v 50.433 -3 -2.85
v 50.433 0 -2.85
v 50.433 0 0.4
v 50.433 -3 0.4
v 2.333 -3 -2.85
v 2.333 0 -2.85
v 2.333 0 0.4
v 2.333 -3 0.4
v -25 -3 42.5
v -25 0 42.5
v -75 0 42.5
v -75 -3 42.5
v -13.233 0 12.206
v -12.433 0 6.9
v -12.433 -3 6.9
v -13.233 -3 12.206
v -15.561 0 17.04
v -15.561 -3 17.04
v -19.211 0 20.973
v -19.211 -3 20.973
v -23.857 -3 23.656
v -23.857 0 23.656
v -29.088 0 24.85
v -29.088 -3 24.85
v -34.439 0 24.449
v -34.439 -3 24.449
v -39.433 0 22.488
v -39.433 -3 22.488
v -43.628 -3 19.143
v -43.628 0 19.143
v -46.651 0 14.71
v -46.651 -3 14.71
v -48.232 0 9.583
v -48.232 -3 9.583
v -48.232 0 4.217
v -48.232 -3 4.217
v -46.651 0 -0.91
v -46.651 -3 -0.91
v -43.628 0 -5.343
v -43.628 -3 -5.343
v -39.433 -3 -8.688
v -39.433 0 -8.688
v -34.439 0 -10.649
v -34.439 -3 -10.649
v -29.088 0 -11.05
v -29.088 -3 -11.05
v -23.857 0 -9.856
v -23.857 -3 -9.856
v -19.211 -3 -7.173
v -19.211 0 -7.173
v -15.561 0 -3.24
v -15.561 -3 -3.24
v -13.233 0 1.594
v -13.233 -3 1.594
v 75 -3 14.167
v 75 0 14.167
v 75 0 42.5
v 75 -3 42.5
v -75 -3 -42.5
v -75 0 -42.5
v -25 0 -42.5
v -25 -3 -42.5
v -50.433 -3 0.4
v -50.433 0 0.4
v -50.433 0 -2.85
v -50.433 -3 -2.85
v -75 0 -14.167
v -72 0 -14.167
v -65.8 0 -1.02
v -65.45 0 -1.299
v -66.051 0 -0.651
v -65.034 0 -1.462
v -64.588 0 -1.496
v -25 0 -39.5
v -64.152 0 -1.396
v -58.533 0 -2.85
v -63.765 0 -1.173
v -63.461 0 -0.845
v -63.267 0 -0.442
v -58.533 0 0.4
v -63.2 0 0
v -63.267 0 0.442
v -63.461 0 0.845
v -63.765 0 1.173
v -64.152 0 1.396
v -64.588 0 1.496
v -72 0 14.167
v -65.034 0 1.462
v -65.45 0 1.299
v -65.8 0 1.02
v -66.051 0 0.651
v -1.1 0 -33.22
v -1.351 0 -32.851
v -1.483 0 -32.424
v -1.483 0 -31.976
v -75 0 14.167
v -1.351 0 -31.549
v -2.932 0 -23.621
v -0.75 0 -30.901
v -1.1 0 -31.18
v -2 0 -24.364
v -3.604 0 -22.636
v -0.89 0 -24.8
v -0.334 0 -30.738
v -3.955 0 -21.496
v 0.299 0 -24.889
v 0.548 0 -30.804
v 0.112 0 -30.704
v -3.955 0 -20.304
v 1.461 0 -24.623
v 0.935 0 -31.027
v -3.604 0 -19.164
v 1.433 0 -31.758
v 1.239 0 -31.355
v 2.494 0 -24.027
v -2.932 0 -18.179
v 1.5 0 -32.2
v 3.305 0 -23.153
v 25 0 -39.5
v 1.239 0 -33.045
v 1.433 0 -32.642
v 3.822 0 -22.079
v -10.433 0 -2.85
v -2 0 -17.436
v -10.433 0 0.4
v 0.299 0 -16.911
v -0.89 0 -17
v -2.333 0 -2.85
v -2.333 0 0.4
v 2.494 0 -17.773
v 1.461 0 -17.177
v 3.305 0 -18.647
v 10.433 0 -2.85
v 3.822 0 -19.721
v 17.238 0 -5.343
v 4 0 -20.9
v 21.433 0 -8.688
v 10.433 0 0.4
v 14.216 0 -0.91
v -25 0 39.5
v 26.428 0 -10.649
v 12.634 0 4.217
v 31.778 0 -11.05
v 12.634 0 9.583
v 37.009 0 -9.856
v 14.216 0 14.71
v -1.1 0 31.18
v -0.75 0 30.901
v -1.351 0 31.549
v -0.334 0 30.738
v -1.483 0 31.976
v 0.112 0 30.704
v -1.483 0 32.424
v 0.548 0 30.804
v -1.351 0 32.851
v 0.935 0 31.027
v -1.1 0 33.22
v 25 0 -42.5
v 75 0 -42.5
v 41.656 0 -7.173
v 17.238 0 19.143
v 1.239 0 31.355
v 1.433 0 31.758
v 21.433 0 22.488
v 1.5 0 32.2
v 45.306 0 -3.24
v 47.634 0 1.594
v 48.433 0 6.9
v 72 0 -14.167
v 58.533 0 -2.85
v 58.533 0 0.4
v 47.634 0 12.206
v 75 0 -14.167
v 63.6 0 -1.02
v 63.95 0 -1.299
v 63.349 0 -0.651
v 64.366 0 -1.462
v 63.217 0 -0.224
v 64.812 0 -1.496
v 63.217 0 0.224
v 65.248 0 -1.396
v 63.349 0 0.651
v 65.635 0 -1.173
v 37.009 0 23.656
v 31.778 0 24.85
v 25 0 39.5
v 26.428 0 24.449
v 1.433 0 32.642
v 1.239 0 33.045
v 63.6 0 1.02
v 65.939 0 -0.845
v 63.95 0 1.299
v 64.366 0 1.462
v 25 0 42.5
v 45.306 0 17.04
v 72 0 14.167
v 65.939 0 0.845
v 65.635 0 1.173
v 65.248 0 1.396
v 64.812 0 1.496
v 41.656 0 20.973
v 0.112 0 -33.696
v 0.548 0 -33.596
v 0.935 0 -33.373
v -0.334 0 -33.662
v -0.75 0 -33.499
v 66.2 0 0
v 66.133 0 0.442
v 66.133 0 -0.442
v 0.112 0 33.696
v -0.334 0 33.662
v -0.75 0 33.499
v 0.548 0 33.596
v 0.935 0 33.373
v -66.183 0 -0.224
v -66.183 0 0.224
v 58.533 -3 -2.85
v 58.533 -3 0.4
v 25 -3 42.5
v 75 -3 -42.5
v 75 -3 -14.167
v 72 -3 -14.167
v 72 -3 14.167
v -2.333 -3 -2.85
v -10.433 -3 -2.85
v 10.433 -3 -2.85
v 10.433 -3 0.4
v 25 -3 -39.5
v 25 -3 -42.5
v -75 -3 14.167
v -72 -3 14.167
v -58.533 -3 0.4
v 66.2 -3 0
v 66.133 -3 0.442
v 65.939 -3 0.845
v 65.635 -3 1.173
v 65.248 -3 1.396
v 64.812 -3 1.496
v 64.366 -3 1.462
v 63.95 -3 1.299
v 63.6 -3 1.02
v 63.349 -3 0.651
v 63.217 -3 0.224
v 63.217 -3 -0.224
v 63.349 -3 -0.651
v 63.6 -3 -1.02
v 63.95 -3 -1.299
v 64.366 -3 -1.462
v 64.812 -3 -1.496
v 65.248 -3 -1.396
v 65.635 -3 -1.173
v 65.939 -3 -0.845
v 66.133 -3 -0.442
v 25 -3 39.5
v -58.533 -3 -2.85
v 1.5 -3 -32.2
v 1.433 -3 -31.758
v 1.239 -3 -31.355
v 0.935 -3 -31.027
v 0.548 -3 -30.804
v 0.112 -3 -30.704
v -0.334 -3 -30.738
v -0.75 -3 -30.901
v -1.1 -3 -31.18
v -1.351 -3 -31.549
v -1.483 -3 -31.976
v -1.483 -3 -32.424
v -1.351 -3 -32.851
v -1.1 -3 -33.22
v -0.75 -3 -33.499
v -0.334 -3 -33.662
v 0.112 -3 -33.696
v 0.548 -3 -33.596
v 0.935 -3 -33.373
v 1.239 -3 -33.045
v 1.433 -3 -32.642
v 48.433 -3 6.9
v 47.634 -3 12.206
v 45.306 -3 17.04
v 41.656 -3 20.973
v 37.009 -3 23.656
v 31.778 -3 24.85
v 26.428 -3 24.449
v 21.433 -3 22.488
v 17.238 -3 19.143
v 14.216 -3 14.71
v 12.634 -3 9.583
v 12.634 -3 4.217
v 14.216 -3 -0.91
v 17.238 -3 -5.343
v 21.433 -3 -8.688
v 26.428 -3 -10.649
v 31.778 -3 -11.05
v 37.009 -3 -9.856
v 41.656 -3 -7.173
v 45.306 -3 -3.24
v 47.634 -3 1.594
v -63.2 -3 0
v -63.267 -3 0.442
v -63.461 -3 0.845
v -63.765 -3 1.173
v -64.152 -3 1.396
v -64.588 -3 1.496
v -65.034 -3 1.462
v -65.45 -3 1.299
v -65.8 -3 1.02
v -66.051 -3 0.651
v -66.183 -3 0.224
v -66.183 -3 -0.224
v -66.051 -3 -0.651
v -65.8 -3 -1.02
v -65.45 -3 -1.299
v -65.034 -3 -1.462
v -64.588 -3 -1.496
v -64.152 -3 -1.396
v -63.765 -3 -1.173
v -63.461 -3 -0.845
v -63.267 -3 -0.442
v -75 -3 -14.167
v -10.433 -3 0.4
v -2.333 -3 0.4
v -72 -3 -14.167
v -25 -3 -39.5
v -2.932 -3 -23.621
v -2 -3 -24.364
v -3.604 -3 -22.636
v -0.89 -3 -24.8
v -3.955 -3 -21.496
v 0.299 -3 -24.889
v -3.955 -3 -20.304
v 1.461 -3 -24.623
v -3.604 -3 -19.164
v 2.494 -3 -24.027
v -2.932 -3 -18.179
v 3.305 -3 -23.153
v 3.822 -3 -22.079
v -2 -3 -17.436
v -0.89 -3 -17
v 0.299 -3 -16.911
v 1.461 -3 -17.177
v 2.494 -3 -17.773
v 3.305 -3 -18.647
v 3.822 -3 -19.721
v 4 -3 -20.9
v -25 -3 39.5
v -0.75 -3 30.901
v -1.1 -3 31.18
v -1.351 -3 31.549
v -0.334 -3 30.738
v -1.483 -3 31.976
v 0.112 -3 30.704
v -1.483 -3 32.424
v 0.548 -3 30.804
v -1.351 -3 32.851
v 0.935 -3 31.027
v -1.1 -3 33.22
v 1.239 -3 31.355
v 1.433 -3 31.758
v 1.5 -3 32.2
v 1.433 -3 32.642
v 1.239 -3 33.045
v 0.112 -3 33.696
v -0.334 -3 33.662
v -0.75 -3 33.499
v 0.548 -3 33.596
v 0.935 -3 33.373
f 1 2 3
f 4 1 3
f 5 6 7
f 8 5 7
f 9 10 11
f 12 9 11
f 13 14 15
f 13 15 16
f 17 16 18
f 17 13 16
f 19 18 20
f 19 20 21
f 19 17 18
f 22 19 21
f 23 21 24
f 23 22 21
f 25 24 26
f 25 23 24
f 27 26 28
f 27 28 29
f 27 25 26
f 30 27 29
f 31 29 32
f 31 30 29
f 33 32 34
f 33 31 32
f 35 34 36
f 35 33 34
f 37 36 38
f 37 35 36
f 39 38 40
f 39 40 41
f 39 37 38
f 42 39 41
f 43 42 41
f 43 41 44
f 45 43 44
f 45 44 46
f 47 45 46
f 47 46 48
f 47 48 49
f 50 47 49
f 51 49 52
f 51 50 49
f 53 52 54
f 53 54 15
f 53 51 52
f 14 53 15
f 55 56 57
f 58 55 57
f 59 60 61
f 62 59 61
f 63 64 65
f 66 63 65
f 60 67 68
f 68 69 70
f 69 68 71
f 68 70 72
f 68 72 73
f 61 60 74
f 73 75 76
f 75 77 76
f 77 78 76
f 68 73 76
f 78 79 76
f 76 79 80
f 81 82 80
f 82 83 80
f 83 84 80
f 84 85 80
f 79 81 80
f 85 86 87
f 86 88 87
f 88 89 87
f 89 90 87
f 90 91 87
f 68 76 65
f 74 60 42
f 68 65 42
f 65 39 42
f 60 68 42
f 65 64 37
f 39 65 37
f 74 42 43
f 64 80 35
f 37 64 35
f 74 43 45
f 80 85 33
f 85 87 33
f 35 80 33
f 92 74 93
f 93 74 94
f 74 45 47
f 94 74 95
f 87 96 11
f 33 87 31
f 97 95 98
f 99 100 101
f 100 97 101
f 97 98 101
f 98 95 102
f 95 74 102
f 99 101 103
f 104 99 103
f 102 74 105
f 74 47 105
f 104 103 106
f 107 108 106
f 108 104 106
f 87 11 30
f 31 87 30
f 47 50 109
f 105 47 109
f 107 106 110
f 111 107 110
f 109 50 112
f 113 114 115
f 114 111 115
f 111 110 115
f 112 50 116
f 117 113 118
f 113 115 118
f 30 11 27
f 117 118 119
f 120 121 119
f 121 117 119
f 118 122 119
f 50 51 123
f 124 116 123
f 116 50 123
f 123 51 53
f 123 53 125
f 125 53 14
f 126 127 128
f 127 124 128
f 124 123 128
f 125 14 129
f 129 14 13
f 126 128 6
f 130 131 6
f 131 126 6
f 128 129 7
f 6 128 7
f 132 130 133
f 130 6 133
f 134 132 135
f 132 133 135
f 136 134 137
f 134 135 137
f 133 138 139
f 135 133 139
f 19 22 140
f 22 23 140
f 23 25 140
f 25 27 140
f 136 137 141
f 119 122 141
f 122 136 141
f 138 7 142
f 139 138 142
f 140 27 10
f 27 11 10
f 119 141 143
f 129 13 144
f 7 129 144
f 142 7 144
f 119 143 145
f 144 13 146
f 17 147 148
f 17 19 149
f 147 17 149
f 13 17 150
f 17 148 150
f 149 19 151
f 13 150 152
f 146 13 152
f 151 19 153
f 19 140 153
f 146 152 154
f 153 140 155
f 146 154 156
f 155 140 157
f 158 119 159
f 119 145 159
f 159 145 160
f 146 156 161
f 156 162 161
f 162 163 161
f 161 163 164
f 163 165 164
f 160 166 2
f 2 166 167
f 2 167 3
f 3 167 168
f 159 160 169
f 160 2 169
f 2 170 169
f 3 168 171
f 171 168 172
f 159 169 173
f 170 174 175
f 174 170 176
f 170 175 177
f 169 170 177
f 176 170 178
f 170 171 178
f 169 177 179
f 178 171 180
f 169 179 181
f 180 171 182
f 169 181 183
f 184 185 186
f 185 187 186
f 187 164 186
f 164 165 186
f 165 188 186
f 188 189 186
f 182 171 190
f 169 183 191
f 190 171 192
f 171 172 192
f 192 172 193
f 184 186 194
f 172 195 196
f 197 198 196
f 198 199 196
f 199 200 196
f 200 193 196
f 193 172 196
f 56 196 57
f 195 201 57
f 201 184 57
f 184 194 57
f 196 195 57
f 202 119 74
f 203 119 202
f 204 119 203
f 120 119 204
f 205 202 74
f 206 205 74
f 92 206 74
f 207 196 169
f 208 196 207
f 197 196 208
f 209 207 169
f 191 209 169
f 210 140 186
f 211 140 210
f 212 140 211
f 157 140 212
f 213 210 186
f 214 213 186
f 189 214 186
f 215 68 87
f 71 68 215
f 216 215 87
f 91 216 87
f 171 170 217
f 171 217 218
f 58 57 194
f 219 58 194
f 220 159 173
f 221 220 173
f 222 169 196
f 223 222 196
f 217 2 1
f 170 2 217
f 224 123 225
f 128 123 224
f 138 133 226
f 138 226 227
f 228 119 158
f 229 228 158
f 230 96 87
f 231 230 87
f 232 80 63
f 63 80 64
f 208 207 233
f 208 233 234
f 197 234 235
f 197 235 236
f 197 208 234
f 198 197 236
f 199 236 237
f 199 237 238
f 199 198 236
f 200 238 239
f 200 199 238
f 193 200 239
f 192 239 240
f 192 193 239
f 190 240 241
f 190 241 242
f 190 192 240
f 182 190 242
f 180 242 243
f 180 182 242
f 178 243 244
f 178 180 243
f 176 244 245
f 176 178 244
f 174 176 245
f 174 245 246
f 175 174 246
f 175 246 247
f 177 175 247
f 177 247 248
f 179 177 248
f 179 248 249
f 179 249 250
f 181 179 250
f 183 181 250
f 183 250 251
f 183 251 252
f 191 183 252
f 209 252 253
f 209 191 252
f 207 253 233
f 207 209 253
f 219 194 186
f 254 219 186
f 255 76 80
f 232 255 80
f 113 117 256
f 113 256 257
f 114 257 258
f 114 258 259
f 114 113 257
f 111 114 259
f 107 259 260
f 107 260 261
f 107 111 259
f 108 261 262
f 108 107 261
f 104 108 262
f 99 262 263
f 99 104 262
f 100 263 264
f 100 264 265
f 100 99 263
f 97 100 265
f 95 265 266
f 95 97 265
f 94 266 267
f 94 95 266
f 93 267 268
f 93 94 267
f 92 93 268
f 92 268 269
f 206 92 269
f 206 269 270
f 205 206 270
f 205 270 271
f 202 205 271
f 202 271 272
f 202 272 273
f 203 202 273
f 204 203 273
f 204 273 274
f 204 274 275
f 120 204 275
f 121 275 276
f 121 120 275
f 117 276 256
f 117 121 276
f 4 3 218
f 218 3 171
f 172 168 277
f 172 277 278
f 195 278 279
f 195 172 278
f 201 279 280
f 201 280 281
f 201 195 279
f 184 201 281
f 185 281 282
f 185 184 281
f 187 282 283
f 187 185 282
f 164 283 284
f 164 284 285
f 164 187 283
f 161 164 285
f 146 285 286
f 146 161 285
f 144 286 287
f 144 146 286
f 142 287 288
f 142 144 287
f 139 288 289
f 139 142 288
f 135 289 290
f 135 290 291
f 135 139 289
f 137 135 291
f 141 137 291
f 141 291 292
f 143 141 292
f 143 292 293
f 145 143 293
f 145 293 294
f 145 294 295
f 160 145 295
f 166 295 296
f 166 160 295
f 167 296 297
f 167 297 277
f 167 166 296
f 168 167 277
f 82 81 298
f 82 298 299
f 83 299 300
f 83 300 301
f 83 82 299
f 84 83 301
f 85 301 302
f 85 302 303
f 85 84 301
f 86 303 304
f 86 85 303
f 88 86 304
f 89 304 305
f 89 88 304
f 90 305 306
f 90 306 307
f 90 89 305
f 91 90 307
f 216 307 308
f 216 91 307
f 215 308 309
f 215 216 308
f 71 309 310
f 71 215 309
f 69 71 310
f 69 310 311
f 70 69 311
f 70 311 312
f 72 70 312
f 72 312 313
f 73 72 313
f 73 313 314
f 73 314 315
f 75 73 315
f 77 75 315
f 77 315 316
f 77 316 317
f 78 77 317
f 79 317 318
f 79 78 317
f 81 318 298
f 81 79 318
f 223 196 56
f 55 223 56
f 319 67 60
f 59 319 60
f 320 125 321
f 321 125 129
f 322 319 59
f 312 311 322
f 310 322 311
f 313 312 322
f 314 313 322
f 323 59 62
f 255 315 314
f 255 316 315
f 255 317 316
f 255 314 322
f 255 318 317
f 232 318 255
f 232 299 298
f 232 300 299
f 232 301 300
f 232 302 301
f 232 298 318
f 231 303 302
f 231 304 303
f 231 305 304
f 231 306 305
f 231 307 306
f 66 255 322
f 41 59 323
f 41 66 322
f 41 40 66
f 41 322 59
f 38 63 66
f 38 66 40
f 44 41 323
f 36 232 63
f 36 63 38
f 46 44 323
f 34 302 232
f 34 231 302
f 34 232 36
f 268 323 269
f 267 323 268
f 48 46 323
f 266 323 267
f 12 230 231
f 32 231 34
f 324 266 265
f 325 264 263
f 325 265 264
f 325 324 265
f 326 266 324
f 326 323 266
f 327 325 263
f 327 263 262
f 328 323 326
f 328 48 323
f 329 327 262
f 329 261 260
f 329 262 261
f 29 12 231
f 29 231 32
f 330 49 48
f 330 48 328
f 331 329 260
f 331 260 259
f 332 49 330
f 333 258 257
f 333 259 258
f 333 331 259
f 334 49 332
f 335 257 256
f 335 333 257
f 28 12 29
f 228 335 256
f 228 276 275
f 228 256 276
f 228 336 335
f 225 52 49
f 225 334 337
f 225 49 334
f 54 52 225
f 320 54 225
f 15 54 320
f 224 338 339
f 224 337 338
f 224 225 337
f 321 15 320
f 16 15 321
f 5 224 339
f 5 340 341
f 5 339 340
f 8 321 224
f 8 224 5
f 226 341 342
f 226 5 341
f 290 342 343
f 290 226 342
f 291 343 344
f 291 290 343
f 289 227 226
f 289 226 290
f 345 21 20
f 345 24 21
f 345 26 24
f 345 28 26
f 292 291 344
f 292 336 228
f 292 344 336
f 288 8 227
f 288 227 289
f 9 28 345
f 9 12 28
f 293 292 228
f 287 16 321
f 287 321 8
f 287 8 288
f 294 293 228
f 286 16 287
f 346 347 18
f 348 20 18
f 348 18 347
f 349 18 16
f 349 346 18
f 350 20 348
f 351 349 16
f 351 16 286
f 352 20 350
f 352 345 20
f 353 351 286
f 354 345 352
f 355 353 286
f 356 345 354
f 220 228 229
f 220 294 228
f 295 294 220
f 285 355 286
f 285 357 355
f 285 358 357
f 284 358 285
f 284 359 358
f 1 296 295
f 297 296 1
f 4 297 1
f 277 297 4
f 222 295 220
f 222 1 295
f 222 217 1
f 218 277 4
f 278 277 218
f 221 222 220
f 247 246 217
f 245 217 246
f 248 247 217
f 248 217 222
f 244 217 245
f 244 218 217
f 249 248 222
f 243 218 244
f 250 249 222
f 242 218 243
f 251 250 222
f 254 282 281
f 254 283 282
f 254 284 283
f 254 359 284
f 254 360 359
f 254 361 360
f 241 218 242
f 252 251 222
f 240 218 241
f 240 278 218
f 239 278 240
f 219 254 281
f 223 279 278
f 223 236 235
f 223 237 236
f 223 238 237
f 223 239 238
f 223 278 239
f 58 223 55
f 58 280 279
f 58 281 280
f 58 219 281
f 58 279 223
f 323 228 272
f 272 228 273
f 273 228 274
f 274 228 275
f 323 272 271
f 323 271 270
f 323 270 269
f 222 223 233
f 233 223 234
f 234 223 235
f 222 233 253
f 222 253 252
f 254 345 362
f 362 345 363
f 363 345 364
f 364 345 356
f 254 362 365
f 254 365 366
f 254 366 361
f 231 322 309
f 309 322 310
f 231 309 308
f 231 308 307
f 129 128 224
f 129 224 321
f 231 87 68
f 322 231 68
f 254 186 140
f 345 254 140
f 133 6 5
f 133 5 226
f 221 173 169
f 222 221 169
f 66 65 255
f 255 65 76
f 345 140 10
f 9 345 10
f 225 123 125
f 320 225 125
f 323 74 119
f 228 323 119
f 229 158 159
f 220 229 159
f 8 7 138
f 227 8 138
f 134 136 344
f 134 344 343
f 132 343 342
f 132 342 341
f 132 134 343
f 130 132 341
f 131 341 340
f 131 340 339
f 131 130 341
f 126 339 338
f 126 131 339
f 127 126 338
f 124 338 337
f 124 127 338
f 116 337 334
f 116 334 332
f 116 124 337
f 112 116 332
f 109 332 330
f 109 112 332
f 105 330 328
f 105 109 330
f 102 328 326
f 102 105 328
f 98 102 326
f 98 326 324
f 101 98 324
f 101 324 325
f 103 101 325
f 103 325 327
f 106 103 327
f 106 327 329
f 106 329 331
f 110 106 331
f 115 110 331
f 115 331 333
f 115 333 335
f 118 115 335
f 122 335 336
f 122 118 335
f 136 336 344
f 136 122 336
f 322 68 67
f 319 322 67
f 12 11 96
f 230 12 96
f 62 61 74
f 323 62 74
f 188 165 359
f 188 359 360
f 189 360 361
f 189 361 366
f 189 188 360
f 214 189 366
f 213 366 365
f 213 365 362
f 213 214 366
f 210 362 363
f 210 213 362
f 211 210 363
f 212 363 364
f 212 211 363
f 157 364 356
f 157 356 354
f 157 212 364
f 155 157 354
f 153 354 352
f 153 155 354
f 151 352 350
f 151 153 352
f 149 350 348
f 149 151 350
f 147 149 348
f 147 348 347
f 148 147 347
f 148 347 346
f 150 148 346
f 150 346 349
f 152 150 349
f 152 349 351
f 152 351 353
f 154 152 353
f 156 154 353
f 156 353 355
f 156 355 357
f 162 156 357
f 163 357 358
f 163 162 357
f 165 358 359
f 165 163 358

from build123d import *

# Parameters (mm, degrees)
F0_W     = 8.1
F0_H     = 3.25
F0_R     = 1.5
F0_R_2   = 4
F0_R_3   = 18
F1_DEPTH = 3


with BuildPart() as f1:
    # F0 (on Front) → F1 (new body)
    with BuildSketch(Plane.XZ):
        Polygon((-75, -14.166667), (-75, -42.5), (-25, -42.5), (-25, -39.5), (25, -39.5), (25, -42.5), (75, -42.5), (75, -14.166667), (72, -14.166667), (72, 14.166667), (75, 14.166667), (75, 42.5), (25, 42.5), (25, 39.5), (-25, 39.5), (-25, 42.5), (-75, 42.5), (-75, 14.166667), (-72, 14.166667), (-72, -14.166667), align=None)
        Polygon((-58.533333, -2.85), (-58.533333, 0), (-58.533333, 0.4), (-50.433333, 0.4), (-50.433333, -2.85), align=None, mode=Mode.SUBTRACT)
        with Locations((-6.383333, -1.225)):
            Rectangle(F0_W, F0_H, mode=Mode.SUBTRACT)
        with Locations((0, -32.2)):
            Circle(F0_R, mode=Mode.SUBTRACT)
        with Locations((0, -20.9)):
            Circle(F0_R_2, mode=Mode.SUBTRACT)
        with Locations((6.383333, -1.225)):
            Rectangle(F0_W, F0_H, mode=Mode.SUBTRACT)
        with Locations((54.483333, -1.225)):
            Rectangle(F0_W, F0_H, mode=Mode.SUBTRACT)
        with Locations((-64.7, 0)):
            Circle(F0_R, mode=Mode.SUBTRACT)
        with Locations((-30.433333, 6.9)):
            Circle(F0_R_3, mode=Mode.SUBTRACT)
        with Locations((30.433333, 6.9)):
            Circle(F0_R_3, mode=Mode.SUBTRACT)
        with Locations((64.7, 0)):
            Circle(F0_R, mode=Mode.SUBTRACT)
        with Locations((0, 32.2)):
            Circle(F0_R, mode=Mode.SUBTRACT)
    extrude(amount=F1_DEPTH)


with BuildPart() as f2_1:
    # F2: copy of F1
    add(f1.part.moved(Location((0, 60, 0))))


solid = f1.part
